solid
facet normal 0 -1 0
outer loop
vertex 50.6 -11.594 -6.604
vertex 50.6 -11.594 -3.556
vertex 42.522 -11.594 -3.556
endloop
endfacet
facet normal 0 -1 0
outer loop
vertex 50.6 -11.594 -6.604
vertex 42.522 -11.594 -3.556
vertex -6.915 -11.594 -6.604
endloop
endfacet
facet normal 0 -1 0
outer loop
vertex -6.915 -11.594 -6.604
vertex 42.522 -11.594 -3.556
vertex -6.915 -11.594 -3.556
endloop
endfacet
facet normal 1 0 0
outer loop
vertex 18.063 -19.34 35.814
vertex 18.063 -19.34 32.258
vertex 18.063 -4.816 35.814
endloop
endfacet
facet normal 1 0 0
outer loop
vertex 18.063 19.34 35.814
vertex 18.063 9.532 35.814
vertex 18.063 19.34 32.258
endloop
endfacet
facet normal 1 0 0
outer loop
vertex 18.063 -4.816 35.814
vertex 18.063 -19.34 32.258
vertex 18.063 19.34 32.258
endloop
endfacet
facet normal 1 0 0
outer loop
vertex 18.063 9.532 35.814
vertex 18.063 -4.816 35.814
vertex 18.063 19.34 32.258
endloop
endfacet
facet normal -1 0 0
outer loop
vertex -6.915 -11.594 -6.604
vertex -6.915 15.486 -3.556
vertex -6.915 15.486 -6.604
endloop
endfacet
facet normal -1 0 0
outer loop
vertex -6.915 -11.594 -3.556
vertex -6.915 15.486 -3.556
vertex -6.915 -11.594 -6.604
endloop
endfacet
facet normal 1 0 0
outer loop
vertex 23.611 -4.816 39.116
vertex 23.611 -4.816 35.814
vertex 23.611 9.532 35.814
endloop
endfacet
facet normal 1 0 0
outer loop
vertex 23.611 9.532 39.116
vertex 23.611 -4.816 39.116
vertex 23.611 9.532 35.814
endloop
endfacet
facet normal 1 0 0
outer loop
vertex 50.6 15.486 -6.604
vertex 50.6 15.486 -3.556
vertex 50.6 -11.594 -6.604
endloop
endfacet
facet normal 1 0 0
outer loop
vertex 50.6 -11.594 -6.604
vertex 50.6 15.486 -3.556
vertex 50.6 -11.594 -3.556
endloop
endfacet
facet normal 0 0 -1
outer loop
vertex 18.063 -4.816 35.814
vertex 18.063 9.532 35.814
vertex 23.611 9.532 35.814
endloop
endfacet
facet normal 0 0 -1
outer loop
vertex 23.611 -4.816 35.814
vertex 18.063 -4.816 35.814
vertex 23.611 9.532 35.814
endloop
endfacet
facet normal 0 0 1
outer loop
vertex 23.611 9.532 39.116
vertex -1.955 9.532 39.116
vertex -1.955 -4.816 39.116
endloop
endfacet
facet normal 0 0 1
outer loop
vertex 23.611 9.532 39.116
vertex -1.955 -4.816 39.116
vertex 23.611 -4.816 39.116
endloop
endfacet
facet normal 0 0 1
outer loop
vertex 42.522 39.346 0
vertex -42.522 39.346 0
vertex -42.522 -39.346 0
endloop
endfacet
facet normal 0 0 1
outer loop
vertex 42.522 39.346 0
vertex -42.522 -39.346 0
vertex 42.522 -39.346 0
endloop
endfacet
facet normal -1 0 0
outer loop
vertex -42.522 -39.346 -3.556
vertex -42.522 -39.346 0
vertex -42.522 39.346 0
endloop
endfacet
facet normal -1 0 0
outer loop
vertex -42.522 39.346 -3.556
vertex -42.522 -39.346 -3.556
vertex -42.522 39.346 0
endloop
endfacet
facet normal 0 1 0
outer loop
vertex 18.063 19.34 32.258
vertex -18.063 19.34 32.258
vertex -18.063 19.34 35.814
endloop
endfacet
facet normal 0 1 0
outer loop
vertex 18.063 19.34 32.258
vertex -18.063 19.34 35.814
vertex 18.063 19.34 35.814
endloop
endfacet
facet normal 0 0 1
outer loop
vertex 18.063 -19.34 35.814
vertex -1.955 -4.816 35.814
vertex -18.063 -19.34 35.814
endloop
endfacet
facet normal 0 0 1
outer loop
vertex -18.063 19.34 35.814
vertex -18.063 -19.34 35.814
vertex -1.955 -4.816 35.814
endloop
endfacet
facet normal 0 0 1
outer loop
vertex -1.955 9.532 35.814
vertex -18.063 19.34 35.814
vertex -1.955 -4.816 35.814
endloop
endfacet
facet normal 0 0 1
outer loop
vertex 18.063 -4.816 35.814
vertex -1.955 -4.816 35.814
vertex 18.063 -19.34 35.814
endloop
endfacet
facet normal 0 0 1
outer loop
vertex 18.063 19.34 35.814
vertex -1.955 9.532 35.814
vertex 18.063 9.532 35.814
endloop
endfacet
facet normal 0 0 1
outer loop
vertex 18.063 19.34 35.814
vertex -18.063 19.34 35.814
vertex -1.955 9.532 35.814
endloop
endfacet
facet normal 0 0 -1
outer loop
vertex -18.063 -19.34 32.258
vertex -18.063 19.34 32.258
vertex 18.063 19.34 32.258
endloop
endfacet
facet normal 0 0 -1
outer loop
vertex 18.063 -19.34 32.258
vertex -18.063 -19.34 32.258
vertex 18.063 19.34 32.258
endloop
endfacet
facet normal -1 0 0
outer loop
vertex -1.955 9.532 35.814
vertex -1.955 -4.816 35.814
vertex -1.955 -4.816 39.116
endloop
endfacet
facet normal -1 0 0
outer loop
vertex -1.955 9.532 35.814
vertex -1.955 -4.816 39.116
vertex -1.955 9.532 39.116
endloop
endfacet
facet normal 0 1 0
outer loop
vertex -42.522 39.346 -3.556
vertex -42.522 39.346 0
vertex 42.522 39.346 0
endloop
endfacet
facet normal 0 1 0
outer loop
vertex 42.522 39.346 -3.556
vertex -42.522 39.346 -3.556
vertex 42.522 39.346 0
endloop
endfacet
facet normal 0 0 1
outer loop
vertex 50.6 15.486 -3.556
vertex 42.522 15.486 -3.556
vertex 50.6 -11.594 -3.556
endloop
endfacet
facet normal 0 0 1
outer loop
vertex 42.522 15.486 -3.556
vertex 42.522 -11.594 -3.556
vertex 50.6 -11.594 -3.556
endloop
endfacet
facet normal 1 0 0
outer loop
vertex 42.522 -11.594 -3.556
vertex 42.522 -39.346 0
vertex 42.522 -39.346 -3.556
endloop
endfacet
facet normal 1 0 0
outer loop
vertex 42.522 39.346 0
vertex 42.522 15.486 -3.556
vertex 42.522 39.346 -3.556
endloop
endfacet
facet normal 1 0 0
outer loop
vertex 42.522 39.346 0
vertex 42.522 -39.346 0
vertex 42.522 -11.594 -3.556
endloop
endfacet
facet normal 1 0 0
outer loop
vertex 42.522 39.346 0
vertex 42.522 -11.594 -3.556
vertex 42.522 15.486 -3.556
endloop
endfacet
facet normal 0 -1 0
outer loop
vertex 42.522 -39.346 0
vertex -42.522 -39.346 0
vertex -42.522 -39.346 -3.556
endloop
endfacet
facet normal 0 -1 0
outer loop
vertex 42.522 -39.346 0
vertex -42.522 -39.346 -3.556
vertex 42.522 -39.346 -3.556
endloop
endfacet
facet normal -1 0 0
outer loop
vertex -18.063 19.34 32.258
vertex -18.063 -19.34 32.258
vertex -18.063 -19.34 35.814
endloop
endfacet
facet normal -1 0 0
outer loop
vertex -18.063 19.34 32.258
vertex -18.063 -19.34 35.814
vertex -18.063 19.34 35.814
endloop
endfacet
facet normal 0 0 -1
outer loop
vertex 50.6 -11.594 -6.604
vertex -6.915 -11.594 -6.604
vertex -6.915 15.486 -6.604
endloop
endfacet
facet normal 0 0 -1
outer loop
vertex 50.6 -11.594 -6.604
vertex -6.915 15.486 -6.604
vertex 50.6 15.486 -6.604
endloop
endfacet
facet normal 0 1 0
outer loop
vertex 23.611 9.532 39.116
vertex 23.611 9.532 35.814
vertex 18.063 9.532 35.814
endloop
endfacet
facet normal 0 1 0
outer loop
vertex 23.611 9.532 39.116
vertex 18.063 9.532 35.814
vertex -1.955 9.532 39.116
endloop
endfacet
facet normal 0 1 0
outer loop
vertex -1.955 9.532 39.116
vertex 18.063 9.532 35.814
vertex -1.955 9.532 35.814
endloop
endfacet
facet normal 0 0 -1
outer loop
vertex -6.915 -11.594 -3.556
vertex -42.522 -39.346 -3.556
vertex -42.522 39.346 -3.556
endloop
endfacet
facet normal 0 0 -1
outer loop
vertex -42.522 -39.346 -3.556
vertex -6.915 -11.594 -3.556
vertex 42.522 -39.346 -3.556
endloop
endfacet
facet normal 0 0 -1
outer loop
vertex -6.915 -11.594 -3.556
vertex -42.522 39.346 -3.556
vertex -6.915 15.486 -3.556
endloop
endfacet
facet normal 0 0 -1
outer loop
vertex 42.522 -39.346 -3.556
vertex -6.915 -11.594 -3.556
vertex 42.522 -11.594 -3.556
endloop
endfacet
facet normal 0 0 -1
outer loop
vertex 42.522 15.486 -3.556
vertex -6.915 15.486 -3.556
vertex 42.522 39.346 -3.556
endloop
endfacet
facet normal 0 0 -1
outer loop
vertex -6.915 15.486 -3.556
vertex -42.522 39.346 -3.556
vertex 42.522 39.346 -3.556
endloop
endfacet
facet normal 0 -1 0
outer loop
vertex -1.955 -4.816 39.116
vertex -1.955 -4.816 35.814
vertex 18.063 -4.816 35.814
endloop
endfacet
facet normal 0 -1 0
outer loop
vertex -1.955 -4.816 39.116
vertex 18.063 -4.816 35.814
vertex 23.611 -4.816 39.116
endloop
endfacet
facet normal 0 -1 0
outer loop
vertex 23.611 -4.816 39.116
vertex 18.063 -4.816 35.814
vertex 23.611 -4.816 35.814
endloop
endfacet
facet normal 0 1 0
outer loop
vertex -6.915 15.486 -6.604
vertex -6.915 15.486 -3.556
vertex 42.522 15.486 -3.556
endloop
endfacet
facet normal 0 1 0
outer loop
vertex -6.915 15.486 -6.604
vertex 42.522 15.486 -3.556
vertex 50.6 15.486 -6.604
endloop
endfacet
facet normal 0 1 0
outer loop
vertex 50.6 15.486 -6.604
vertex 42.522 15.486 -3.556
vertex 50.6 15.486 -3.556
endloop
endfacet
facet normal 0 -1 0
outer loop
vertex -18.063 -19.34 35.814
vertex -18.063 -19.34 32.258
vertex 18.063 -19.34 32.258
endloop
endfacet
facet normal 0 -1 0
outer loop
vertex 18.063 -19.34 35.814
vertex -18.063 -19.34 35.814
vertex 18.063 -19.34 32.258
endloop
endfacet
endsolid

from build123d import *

# Parameters (mm, degrees)
F2_W     = 36.126006
F2_H     = 38.680818
F3_DEPTH = 3.556
F0_W     = 85.04486
F0_H     = 78.692556
F4_DEPTH = 3.556
F5_W     = 20.018459
F5_H     = 14.347644
F5_W_2   = 5.548455
F6_DEPTH = 3.302
F7_W     = 8.077156
F7_H     = 27.079672
F7_W_2   = 49.43719
F8_DEPTH = 3.048


with BuildPart() as f3:
    # F2 (on offset) → F3 (new body)
    with BuildSketch(Plane.XY.offset(32.258)):
        Rectangle(F2_W, F2_H)
    extrude(amount=F3_DEPTH)

    # F5 (on face) → F6 (join)
    with BuildSketch(Plane.XY.offset(35.814)):
        with Locations((8.053773, 2.35779)):
            Rectangle(F5_W, F5_H)
        with Locations((20.83723, 2.35779)):
            Rectangle(F5_W_2, F5_H)
    extrude(amount=F6_DEPTH)


with BuildPart() as f4:
    # F0 (on Top) → F4 (new body)
    with BuildSketch(Plane.XY):
        Rectangle(F0_W, F0_H)
    extrude(amount=-F4_DEPTH)

    # F7 (on face) → F8 (join)
    with BuildSketch(Plane(origin=(0, 0, -3.556), x_dir=(1, 0, 0), z_dir=(0, 0, -1))):
        with Locations((46.561008, -1.946157)):
            Rectangle(F7_W, F7_H)
        with Locations((17.803835, -1.946157)):
            Rectangle(F7_W_2, F7_H)
    extrude(amount=F8_DEPTH)


solid = Compound([f3.part, f4.part])
